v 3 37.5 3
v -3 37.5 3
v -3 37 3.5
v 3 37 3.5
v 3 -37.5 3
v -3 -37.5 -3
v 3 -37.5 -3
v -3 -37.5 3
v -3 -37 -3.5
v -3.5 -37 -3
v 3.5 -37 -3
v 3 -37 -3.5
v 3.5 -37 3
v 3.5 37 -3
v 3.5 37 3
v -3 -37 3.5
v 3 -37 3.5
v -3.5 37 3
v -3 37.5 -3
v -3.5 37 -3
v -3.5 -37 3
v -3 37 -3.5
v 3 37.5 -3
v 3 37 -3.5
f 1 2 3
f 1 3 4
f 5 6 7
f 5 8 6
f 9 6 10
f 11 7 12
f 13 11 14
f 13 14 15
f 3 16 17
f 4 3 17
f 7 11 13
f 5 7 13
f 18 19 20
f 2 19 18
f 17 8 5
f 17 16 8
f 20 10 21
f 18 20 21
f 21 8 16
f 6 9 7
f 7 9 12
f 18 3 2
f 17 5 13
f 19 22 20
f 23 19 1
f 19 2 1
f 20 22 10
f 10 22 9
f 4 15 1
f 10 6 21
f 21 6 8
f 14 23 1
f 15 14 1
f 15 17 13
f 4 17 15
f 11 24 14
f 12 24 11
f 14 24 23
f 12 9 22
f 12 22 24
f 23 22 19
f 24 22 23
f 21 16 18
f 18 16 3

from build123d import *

# Parameters (mm, degrees)
F0_W     = 7
F0_H     = 7
F1_DEPTH = 37.5
F2_SIZE  = 0.5


with BuildPart() as f1:
    # F0 (on Front) → F1 (new body, symmetric)
    with BuildSketch(Plane.XZ):
        Rectangle(F0_W, F0_H)
    extrude(amount=F1_DEPTH, both=True)

    # F2
    f2_edges = [f1.edges().sort_by_distance(p)[0] for p in [
        (0, -37.5, -3.5),
        (3.5, -37.5, 0),
        (0, -37.5, 3.5),
        (-3.5, -37.5, 0),
        (3.5, 0, 3.5),
        (3.5, 0, -3.5),
        (-3.5, 0, 3.5),
        (-3.5, 0, -3.5),
        (0, 37.5, -3.5),
        (3.5, 37.5, 0),
        (0, 37.5, 3.5),
        (-3.5, 37.5, 0),
    ]]
    chamfer(f2_edges, length=F2_SIZE)


solid = f1.part
